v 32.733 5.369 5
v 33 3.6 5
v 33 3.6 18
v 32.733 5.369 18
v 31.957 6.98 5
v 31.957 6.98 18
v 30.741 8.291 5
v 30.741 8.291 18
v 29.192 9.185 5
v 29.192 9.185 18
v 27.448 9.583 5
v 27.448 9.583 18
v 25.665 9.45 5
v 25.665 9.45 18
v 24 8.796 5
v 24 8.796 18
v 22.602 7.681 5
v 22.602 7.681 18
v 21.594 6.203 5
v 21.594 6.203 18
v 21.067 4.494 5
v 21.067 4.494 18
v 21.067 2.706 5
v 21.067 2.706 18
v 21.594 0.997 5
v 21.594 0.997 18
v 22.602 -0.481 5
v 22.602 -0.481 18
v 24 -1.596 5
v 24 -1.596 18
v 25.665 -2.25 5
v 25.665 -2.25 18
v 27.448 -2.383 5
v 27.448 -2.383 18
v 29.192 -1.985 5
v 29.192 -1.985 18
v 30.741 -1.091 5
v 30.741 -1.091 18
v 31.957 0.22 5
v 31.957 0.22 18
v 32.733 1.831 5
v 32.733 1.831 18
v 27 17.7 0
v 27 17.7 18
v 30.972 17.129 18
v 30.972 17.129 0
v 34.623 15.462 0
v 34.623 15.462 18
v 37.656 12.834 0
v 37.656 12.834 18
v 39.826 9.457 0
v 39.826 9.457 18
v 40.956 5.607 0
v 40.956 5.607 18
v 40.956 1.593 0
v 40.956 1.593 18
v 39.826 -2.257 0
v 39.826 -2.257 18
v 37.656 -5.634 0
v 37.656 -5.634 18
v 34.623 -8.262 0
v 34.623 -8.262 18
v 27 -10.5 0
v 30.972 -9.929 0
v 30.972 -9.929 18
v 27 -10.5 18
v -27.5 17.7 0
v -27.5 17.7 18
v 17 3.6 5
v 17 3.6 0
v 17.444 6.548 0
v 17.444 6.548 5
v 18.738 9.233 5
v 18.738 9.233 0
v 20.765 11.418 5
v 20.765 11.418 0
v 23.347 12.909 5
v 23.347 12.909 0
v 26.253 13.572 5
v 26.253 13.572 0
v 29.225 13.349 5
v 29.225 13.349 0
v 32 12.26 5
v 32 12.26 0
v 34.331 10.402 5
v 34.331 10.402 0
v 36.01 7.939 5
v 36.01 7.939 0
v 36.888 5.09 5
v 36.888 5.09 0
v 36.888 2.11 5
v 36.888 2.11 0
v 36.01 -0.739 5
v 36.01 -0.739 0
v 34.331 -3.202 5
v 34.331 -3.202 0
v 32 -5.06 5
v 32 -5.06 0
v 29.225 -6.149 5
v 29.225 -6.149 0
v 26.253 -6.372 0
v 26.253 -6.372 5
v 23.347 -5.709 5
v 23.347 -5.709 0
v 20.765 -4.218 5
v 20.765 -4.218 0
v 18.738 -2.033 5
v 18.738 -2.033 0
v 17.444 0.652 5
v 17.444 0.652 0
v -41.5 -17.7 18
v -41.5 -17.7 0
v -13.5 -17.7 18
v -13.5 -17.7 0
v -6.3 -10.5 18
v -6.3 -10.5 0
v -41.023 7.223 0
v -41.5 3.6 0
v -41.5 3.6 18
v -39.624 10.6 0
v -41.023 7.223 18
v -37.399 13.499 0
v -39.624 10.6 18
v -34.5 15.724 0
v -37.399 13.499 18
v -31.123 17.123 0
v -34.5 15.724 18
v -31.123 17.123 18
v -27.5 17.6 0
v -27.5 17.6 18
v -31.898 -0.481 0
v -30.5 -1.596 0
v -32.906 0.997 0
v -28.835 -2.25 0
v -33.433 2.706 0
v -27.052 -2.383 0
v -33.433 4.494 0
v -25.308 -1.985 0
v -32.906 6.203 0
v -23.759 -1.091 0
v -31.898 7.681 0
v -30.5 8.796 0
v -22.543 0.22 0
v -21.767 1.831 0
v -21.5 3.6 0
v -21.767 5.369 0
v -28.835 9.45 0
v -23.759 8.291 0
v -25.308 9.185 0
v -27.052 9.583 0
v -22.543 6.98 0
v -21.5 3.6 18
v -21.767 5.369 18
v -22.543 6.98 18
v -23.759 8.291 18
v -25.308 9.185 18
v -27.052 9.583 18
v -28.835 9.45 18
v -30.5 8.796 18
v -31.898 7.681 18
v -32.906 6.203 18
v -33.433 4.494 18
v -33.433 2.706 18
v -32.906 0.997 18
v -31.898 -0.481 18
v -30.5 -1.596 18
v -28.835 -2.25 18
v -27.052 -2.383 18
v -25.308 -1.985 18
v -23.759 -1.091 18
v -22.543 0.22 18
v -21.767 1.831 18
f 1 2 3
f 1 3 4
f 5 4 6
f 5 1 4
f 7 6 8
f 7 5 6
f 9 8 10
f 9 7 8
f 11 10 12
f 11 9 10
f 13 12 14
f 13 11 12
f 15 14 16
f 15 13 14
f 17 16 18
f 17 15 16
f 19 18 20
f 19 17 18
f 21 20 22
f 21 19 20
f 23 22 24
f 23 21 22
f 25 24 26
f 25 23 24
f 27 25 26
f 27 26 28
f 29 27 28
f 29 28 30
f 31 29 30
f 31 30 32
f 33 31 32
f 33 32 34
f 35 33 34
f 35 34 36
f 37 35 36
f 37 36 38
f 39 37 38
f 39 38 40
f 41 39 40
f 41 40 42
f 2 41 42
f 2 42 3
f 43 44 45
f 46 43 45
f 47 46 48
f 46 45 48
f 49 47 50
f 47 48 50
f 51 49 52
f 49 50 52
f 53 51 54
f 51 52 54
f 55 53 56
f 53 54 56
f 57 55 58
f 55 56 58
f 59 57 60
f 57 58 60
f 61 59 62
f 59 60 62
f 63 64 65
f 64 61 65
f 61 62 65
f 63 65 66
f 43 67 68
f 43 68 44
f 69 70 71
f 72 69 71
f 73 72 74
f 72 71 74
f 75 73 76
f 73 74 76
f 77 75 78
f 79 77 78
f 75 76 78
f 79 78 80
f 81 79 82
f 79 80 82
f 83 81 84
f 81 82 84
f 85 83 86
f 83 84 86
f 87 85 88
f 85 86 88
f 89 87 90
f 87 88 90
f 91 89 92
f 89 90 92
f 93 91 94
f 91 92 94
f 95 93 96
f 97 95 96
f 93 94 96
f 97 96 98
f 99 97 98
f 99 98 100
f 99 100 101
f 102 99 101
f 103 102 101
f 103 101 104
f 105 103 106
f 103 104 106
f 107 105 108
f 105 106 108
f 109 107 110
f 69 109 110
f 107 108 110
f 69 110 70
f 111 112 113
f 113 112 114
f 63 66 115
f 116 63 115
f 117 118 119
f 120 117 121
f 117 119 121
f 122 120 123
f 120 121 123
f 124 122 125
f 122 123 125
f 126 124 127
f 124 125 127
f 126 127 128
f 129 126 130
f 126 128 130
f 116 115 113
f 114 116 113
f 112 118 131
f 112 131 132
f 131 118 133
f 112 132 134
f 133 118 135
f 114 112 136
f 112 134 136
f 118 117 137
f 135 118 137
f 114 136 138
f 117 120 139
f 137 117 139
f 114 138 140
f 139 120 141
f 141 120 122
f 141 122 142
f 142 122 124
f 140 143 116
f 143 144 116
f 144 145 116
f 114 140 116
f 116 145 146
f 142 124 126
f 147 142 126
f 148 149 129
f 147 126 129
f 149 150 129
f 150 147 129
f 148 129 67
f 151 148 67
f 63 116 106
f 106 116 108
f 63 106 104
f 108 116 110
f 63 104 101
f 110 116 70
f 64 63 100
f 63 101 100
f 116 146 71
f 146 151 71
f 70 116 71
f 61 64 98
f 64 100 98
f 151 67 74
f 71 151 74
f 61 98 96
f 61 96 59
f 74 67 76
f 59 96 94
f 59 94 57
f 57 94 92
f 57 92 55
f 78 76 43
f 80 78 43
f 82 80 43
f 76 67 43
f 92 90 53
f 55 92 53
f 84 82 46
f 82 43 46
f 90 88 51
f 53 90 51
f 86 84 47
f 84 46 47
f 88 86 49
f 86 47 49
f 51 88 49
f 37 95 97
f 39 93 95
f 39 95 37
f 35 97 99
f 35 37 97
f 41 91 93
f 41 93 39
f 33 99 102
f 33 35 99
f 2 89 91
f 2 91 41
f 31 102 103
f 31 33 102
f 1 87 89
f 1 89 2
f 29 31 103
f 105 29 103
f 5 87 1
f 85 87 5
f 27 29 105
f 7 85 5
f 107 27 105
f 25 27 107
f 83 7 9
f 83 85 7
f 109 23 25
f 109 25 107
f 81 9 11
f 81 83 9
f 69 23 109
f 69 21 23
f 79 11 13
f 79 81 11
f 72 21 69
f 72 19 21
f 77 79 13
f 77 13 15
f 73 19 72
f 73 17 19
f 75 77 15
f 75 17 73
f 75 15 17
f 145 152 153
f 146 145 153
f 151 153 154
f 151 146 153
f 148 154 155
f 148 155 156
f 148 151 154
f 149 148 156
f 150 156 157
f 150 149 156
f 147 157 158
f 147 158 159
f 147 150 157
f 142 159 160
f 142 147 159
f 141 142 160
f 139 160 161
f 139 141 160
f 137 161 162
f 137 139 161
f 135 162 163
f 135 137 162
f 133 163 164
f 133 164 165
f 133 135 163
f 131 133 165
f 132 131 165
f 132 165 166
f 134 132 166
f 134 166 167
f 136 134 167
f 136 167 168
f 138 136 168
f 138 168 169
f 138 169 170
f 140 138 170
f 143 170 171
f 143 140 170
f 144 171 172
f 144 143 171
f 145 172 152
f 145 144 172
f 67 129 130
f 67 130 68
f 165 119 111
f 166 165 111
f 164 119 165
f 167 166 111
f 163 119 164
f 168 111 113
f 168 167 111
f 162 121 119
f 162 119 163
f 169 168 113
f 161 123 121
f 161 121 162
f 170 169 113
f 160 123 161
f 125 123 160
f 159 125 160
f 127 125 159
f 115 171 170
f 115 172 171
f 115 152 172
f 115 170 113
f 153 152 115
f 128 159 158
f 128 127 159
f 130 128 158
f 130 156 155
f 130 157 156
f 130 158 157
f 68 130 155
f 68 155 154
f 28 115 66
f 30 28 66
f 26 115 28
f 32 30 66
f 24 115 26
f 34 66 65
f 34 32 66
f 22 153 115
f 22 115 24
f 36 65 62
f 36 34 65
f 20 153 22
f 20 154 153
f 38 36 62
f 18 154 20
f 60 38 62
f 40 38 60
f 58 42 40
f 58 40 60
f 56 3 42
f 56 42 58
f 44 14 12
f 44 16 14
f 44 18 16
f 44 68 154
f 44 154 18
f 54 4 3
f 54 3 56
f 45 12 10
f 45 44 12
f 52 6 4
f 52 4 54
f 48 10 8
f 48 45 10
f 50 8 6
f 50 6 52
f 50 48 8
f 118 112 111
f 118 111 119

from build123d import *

# Parameters (mm, degrees)
SKETCH1_W           = 83
SKETCH1_H           = 35.4
SKETCH1_R           = 6
BOSS_EXTRUDE1_DEPTH = 18
CUT_EXTRUDE1_DEPTH  = 49.5750965
CUT_EXTRUDE2_DEPTH  = 49.5750965
SKETCH4_R           = 10
CUT_EXTRUDE3_DEPTH  = 5


with BuildPart() as part:
    # Sketch1 → Boss-Extrude1 (new body)
    with BuildSketch(Plane.XY):
        Rectangle(SKETCH1_W, SKETCH1_H)
        with Locations((-27.5, 3.6)):
            Circle(SKETCH1_R, mode=Mode.SUBTRACT)
        with Locations((27, 3.6)):
            Circle(SKETCH1_R, mode=Mode.SUBTRACT)
    extrude(amount=BOSS_EXTRUDE1_DEPTH)

    # Sketch2 → Cut-Extrude1 (cut, through all)
    with BuildSketch(Plane.XY.offset(18)):
        with BuildLine():
            Line((27, -10.5), (-6.3, -10.5))
            Line((-6.3, -10.5), (-13.5, -17.7))
            Line((-13.5, -17.7), (-41.5, -17.7))
            Line((-41.5, -17.7), (-41.5, -37.108146422))
            Line((-41.5, -37.108146422), (58.064931867, -37.108146422))
            Line((58.064931867, -37.108146422), (58.064931867, 31.4831893))
            Line((58.064931867, 31.4831893), (27, 31.4831893))
            Line((27, 31.4831893), (27, 17.7))
            ThreePointArc((27, 17.7), (41.1, 3.6), (27, -10.5))
        make_face()
    extrude(amount=-CUT_EXTRUDE1_DEPTH, mode=Mode.SUBTRACT)

    # Sketch3 → Cut-Extrude2 (cut, through all)
    with BuildSketch(Plane.XY.offset(18)):
        with BuildLine():
            Line((-27.5, 17.6), (-27.5, 27.141783499))
            Line((-27.5, 27.141783499), (-58.476255023, 27.141783499))
            Line((-58.476255023, 27.141783499), (-58.476255023, 3.6))
            Line((-58.476255023, 3.6), (-41.5, 3.6))
            ThreePointArc((-41.5, 3.6), (-37.399494937, 13.499494937), (-27.5, 17.6))
        make_face()
    extrude(amount=-CUT_EXTRUDE2_DEPTH, mode=Mode.SUBTRACT)

    # Sketch4 → Cut-Extrude3 (cut)
    with BuildSketch(Plane(origin=(0, 0, 0), x_dir=(-1, 0, 0), z_dir=(0, 0, -1))):
        with Locations((-27, 3.6)):
            Circle(SKETCH4_R)
    extrude(amount=-CUT_EXTRUDE3_DEPTH, mode=Mode.SUBTRACT)


solid = part.part
